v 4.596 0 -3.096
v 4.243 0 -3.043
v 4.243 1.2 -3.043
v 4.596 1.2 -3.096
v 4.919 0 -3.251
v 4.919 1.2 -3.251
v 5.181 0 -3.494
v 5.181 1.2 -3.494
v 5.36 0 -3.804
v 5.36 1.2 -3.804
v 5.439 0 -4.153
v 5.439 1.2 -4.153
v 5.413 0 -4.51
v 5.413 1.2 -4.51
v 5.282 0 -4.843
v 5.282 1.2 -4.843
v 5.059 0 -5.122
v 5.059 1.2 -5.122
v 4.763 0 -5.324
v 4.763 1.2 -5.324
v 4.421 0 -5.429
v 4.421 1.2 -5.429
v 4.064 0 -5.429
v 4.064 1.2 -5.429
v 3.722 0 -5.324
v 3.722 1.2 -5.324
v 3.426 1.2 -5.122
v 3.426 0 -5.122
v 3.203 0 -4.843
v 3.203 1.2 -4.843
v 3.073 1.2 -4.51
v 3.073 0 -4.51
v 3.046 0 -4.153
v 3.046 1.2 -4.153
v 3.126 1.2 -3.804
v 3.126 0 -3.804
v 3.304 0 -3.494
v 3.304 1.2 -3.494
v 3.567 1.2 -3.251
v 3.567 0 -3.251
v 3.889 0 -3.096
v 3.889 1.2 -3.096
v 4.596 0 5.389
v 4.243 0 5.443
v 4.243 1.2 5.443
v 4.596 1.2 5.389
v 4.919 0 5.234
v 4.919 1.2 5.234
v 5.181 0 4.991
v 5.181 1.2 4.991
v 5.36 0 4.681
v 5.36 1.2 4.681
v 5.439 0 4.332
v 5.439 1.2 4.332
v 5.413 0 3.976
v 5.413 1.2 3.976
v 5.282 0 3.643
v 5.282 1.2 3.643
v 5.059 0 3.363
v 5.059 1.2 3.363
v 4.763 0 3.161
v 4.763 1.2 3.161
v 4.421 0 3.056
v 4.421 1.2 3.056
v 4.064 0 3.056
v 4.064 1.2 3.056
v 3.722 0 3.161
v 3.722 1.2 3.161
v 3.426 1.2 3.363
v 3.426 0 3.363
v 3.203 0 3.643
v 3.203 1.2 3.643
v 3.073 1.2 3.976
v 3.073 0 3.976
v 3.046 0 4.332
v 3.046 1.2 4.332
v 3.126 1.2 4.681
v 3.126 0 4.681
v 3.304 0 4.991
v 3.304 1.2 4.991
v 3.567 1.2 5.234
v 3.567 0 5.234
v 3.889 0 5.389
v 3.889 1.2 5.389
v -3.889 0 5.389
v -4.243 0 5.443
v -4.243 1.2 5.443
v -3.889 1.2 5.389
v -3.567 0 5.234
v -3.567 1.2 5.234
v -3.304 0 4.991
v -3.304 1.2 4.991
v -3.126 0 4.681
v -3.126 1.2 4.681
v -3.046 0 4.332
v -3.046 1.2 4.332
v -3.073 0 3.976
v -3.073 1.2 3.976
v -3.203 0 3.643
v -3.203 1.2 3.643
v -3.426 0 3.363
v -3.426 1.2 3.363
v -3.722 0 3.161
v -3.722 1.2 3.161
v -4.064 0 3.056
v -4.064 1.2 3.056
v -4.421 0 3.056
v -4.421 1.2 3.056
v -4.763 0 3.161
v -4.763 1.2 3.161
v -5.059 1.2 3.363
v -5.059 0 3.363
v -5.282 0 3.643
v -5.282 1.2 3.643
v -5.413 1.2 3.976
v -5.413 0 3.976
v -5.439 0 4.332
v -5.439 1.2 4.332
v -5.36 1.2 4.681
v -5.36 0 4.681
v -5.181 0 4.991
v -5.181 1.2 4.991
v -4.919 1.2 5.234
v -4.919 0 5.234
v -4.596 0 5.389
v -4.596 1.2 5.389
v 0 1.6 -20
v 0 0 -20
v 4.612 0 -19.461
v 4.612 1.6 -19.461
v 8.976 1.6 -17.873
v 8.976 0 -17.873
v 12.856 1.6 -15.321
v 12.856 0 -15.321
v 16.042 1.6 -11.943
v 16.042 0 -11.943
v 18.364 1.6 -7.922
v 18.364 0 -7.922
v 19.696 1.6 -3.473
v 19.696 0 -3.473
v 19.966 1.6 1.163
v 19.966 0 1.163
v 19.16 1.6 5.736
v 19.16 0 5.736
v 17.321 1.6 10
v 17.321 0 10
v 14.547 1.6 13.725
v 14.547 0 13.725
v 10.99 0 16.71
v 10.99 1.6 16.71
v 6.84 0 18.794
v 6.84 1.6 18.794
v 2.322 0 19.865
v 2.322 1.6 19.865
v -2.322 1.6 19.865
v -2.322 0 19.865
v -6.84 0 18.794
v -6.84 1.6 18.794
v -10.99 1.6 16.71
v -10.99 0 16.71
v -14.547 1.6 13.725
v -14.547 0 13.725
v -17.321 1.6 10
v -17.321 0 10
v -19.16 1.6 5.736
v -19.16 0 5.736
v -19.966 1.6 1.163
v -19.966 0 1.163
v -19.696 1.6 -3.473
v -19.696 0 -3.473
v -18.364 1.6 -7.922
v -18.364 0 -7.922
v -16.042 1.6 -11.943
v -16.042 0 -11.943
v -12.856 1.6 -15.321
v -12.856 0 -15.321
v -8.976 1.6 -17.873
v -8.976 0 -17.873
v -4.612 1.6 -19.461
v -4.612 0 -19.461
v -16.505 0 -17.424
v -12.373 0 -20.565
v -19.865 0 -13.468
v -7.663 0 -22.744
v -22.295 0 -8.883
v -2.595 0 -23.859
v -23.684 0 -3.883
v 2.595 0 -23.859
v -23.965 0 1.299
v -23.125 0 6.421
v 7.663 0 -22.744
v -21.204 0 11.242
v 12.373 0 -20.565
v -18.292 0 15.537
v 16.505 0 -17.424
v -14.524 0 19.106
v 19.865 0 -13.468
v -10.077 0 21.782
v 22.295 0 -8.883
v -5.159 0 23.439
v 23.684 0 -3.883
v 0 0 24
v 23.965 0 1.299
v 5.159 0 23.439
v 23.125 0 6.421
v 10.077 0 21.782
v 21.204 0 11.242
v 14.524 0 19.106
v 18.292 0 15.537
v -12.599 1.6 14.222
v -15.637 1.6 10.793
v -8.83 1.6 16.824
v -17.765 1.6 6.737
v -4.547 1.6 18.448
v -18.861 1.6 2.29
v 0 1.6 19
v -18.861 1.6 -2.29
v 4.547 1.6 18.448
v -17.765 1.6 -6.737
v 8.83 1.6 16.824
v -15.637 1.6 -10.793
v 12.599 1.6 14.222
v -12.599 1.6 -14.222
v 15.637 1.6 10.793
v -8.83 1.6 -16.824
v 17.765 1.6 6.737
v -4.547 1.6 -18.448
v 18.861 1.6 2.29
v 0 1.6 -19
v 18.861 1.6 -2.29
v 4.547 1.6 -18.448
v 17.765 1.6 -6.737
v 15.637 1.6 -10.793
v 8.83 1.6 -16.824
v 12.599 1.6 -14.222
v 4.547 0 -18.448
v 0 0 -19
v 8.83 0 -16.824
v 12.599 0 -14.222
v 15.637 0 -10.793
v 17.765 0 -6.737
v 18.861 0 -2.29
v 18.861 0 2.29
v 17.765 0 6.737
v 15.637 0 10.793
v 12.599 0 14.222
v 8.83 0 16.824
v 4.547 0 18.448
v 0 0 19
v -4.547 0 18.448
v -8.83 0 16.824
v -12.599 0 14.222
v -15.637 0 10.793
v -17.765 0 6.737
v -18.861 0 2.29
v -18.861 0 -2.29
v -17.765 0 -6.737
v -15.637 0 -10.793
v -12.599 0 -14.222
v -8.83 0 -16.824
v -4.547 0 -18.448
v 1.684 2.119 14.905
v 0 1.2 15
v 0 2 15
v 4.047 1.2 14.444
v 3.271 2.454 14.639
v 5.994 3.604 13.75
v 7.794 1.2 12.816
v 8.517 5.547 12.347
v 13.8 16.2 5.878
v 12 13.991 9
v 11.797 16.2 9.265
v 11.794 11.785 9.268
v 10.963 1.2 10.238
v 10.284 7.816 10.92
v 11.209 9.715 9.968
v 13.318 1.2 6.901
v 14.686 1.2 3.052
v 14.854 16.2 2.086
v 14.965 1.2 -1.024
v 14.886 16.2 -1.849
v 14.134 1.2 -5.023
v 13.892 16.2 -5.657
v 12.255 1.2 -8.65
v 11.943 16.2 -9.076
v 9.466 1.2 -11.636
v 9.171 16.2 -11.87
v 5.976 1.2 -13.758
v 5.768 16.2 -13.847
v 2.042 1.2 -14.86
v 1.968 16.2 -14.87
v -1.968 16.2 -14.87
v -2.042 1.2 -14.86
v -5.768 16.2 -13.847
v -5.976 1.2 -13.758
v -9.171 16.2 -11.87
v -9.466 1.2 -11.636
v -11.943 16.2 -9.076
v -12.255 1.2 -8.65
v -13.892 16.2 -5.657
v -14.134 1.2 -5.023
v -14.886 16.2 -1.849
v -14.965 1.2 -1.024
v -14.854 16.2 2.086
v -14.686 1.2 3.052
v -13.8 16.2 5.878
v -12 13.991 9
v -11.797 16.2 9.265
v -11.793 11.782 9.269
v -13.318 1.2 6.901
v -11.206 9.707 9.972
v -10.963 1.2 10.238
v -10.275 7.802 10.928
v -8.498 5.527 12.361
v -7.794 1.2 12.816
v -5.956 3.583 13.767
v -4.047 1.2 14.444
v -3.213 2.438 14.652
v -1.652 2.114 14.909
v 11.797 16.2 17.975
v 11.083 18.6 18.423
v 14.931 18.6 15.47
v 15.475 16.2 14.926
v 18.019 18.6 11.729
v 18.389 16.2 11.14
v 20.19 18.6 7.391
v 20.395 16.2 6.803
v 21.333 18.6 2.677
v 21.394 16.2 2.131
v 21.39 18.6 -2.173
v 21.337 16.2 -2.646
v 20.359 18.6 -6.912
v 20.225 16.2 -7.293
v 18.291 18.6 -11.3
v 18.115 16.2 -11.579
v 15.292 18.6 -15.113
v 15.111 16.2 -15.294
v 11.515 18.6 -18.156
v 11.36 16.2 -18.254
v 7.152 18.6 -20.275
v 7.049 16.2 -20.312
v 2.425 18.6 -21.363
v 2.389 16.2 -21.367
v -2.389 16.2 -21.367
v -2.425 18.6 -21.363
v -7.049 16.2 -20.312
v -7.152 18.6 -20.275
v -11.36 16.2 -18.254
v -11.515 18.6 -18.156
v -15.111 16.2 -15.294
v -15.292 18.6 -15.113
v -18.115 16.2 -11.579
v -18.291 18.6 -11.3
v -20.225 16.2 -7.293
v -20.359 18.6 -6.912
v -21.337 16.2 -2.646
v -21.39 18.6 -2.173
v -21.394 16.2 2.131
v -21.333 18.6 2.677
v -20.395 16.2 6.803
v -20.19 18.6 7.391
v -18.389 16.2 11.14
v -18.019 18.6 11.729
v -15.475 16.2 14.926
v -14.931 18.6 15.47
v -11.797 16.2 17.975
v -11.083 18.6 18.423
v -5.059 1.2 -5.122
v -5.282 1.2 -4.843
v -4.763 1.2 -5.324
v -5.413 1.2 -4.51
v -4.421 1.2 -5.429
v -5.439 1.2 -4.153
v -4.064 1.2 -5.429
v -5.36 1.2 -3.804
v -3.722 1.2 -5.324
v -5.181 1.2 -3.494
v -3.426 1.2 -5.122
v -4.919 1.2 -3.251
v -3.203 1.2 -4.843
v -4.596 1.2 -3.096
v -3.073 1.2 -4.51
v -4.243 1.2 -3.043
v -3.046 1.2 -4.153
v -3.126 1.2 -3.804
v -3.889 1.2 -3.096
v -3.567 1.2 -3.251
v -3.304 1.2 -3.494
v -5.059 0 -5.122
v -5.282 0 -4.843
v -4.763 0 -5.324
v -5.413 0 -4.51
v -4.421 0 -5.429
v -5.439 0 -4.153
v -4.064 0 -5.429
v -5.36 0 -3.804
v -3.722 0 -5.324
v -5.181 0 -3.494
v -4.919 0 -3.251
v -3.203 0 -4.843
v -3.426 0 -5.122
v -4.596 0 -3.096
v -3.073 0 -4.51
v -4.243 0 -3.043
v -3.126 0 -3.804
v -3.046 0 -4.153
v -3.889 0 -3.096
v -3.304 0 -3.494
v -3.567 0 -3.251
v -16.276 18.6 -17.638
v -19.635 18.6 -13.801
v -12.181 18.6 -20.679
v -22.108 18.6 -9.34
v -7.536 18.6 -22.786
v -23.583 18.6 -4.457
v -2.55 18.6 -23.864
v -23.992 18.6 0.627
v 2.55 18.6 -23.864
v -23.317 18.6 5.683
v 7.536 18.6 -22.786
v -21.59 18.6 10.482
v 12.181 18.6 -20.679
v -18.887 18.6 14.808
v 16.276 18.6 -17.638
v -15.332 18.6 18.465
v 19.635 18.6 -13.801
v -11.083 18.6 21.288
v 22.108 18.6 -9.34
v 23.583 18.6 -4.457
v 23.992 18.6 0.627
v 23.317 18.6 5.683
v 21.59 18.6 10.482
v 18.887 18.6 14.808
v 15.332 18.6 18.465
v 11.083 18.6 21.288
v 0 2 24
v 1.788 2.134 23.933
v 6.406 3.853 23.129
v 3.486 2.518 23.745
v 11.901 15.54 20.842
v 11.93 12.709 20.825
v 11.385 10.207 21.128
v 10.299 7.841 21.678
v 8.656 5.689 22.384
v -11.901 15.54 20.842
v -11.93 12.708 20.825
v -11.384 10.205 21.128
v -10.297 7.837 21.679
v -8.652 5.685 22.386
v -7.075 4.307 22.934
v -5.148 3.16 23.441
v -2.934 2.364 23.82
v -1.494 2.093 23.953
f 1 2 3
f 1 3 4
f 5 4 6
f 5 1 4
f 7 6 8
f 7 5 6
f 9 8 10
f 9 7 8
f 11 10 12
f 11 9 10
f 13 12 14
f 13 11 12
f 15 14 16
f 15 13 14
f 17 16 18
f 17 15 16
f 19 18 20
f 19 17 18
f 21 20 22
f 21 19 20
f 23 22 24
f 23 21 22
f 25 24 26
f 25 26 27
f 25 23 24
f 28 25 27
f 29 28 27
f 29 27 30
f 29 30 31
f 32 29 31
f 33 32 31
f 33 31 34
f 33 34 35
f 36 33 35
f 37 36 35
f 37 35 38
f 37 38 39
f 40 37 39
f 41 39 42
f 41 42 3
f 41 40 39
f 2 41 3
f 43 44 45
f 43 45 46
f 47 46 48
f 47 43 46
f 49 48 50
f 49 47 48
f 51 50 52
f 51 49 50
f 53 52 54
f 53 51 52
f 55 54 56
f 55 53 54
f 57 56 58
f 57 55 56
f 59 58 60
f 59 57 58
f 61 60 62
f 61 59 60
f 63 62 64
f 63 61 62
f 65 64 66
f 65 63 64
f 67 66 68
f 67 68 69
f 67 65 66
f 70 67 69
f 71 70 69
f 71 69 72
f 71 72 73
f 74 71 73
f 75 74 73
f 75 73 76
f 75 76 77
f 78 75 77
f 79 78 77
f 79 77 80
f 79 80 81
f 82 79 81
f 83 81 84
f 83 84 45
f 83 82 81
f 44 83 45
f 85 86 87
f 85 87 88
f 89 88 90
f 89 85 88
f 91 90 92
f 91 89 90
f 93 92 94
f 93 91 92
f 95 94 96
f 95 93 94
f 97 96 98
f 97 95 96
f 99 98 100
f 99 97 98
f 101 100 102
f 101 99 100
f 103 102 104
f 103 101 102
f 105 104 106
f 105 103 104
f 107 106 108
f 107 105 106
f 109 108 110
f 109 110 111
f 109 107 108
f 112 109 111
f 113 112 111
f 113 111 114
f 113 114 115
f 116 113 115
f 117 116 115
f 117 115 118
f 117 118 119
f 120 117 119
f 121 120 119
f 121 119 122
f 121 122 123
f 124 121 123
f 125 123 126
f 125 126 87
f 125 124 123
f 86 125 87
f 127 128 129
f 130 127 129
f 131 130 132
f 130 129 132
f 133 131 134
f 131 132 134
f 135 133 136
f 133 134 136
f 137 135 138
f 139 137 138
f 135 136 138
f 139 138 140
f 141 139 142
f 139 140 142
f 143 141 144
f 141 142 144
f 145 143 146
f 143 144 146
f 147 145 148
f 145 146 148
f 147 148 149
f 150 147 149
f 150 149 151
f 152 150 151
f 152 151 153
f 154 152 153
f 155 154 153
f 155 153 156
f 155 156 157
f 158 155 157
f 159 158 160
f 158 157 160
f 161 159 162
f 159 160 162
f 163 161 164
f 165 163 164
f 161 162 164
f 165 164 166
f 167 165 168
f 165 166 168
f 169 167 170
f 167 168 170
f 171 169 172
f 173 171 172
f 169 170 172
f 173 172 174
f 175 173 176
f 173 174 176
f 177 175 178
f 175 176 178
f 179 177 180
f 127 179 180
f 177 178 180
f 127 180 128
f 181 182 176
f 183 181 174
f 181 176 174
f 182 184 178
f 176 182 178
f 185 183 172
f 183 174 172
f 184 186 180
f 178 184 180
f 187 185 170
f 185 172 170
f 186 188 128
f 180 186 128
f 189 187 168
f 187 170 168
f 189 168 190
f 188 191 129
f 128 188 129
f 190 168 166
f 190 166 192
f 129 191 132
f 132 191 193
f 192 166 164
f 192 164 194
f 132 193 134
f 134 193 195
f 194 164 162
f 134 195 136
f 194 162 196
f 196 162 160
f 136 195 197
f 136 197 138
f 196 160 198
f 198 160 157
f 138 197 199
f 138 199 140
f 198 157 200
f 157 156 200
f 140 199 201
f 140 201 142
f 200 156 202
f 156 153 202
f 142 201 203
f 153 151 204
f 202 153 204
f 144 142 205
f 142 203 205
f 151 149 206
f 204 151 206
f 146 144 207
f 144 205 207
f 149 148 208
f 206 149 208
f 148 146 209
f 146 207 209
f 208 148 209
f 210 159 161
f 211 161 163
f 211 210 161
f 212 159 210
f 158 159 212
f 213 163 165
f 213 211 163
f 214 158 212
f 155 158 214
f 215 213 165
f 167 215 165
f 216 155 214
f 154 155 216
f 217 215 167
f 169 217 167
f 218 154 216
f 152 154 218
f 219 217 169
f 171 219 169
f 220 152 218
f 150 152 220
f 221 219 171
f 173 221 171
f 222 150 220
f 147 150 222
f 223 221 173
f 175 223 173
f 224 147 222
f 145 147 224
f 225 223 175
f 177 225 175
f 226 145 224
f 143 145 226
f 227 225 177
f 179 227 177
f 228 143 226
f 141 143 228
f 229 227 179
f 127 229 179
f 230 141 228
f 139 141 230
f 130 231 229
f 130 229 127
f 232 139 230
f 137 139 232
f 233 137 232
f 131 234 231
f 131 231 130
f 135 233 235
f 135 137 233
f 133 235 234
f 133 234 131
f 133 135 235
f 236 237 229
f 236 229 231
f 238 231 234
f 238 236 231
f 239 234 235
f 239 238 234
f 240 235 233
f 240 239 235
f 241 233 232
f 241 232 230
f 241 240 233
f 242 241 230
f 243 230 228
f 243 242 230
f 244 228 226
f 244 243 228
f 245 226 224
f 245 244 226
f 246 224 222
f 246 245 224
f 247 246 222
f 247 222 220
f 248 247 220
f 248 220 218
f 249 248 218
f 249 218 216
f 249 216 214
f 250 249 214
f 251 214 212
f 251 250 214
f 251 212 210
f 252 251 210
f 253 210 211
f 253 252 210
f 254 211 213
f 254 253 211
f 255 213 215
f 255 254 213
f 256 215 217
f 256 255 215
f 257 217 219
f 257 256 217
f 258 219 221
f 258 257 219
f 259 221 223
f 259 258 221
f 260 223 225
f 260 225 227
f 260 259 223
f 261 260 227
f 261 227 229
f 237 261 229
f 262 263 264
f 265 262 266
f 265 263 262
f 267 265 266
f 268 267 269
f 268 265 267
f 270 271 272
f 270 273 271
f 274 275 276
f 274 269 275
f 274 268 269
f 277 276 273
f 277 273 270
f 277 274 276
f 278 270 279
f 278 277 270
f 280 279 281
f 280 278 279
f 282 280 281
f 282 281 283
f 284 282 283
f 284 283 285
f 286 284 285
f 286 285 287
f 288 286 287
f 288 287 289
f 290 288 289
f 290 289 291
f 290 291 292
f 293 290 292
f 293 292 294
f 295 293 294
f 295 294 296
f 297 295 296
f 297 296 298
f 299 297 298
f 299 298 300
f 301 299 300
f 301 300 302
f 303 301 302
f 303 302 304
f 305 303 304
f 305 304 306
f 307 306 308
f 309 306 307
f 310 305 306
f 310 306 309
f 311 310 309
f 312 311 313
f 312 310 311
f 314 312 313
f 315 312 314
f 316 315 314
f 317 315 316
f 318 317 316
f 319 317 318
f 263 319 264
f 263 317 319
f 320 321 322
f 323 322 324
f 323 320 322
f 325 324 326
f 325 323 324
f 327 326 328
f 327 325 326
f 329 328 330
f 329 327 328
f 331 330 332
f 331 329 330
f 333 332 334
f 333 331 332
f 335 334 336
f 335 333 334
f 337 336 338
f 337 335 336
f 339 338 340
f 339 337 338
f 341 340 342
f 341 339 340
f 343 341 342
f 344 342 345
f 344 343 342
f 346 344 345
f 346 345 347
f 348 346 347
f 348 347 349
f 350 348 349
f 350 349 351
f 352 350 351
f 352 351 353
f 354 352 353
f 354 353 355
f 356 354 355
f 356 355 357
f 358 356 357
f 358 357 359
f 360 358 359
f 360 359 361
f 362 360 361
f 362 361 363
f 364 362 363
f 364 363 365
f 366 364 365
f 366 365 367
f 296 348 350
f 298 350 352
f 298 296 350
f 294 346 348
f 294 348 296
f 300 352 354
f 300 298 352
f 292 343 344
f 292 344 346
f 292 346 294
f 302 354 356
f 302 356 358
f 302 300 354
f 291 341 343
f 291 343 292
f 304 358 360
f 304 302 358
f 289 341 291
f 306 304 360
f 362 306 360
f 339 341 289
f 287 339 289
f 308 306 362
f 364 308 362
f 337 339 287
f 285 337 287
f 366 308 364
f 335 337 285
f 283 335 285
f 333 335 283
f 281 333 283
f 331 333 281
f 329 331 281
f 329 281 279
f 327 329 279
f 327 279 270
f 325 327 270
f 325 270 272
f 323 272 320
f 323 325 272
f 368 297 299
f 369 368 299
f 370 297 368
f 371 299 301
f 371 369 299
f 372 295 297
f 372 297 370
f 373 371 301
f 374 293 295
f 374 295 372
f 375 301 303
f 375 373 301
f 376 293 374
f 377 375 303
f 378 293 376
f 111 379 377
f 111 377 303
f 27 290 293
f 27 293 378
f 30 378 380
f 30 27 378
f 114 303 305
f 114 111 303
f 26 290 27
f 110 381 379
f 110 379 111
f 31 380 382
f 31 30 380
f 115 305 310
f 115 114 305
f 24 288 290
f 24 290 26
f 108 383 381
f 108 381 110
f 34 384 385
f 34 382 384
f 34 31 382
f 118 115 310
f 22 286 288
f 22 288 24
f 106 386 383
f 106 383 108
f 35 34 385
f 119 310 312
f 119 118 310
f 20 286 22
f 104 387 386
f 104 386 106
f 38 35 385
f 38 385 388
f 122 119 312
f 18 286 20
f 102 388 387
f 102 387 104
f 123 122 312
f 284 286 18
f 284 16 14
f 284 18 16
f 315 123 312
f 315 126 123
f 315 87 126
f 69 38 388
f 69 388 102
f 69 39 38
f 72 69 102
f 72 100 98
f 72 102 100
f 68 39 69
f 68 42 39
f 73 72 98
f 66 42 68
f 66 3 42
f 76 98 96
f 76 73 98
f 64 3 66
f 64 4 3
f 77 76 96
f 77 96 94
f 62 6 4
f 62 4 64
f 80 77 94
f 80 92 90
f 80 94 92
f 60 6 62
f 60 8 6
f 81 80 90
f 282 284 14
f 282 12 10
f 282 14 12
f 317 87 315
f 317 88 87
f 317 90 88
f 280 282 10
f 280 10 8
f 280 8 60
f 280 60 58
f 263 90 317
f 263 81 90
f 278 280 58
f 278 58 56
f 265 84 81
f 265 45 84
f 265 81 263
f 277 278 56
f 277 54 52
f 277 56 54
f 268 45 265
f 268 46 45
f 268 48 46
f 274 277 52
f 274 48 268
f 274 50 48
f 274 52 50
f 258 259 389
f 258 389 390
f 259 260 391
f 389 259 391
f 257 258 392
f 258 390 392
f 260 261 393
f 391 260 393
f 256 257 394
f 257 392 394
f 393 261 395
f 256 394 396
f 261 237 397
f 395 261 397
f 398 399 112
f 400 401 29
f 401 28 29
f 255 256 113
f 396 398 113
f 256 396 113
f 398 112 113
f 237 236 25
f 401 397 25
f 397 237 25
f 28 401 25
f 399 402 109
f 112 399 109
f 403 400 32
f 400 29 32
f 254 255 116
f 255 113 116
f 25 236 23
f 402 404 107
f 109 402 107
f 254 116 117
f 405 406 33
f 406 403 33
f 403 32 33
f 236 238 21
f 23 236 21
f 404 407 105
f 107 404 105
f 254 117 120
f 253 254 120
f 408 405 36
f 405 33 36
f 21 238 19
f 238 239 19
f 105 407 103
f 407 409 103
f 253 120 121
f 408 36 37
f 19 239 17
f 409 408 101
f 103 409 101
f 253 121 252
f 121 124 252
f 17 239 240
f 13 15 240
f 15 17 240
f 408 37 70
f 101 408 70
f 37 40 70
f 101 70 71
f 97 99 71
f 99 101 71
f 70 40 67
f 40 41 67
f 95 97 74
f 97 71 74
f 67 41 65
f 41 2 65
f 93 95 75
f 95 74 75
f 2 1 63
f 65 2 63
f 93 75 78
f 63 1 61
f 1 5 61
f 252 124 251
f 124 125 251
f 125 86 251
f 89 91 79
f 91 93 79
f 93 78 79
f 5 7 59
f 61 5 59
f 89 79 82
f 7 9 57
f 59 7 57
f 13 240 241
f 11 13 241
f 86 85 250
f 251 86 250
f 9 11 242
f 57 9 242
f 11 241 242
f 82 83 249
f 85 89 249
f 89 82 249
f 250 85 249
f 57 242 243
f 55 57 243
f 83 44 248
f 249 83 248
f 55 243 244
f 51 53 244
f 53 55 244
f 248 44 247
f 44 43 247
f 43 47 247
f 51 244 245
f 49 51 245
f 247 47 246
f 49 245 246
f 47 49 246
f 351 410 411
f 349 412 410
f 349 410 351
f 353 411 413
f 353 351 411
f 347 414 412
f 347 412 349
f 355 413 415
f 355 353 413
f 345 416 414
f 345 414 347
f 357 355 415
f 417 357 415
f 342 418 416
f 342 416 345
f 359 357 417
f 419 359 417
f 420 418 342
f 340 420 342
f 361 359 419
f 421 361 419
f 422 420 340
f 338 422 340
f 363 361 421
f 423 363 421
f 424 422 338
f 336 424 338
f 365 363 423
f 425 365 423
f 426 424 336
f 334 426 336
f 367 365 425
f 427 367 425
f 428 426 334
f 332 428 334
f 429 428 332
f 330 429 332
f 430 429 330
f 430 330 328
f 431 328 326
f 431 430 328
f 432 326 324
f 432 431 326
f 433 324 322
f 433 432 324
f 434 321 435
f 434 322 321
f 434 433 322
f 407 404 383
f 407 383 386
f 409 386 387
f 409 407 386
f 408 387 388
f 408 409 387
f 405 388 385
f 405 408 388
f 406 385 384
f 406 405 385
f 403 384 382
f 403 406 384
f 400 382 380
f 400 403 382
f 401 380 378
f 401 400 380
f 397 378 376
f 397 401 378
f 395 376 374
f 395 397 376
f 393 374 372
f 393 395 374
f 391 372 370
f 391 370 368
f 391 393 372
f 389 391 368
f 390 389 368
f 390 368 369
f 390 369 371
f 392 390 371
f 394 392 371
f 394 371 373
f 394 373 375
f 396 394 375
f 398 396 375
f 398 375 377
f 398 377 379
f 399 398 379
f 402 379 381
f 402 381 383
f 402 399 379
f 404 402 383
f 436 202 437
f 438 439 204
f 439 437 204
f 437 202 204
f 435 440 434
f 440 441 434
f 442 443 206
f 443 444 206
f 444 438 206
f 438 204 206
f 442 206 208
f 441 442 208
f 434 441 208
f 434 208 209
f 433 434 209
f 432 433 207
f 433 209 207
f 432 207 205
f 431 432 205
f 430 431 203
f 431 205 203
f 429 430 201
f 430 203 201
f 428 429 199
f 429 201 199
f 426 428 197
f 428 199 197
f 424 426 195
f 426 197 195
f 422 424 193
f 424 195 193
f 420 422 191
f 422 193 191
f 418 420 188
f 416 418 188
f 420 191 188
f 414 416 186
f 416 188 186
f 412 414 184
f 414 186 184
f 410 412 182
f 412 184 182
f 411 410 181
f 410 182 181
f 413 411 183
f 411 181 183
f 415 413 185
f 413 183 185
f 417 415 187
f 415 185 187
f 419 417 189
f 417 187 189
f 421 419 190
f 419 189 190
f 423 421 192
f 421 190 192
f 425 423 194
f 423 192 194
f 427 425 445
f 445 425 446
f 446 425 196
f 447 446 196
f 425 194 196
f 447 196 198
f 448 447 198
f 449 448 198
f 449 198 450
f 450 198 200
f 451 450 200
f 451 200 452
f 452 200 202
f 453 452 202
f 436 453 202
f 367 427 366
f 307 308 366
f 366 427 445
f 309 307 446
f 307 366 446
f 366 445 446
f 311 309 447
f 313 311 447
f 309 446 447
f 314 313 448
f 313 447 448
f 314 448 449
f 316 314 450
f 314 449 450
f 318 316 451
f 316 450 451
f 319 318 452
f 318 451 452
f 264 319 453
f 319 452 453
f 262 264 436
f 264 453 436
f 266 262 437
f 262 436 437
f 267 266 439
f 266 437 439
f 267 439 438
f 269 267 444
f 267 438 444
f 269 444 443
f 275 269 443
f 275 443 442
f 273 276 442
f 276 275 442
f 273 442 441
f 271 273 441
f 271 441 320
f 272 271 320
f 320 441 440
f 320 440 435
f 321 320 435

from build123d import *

# Parameters (mm, degrees)
SKETCH1_R           = 24
SKETCH1_R_2         = 1.2
BOSS_EXTRUDE1_DEPTH = 1.2
SKETCH2_R           = 24
SKETCH2_R_2         = 15
BOSS_EXTRUDE2_DEPTH = 15
SKETCH3_R           = 24
SKETCH3_R_2         = 21.5
BOSS_EXTRUDE3_DEPTH = 2.4
SKETCH5_R           = 12
CUT_EXTRUDE2_DEPTH  = 20
SKETCH6_R           = 20
SKETCH6_R_2         = 19
CUT_EXTRUDE3_DEPTH  = 1.6


with BuildPart() as part:
    # Sketch1 → Boss-Extrude1 (new body)
    with BuildSketch(Plane(origin=(0, 0, 0), x_dir=(1, 0, 0), z_dir=(0, 1, 0))):
        with Locations(Location((0, 0, 0), (0, 0, 270))):
            Circle(SKETCH1_R)
        with Locations(Location((4.242640687, 4.242640687, 0), (0, 0, 270))):
            Circle(SKETCH1_R_2, mode=Mode.SUBTRACT)
        with Locations(Location((-4.242640687, 4.242640687, 0), (0, 0, 270))):
            Circle(SKETCH1_R_2, mode=Mode.SUBTRACT)
        with Locations(Location((4.242640687, -4.242640687, 0), (0, 0, 270))):
            Circle(SKETCH1_R_2, mode=Mode.SUBTRACT)
        with Locations(Location((-4.242640687, -4.242640687, 0), (0, 0, 270))):
            Circle(SKETCH1_R_2, mode=Mode.SUBTRACT)
    extrude(amount=BOSS_EXTRUDE1_DEPTH)

    # Sketch2 → Boss-Extrude2 (add)
    with BuildSketch(Plane(origin=(0, 1.2, 0), x_dir=(1, 0, 0), z_dir=(0, 1, 0))):
        with Locations(Location((0, 0, 0), (0, 0, 270))):
            Circle(SKETCH2_R)
        with Locations(Location((0, 0, 0), (0, 0, 270))):
            Circle(SKETCH2_R_2, mode=Mode.SUBTRACT)
    extrude(amount=BOSS_EXTRUDE2_DEPTH)

    # Sketch3 → Boss-Extrude3 (add)
    with BuildSketch(Plane(origin=(0, 16.2, 0), x_dir=(1, 0, 0), z_dir=(0, 1, 0))):
        with Locations(Location((0, 0, 0), (0, 0, 270))):
            Circle(SKETCH3_R)
        with Locations(Location((0, 0, 0), (0, 0, 270))):
            Circle(SKETCH3_R_2, mode=Mode.SUBTRACT)
    extrude(amount=BOSS_EXTRUDE3_DEPTH)

    # Sketch5 → Cut-Extrude2 (cut)
    with BuildSketch(Plane.XY.offset(24)):
        with Locations((0, 14)):
            Circle(SKETCH5_R)
    extrude(amount=-CUT_EXTRUDE2_DEPTH, mode=Mode.SUBTRACT)

    # Sketch6 → Cut-Extrude3 (cut)
    with BuildSketch(Plane.XZ):
        with Locations(Location((0, 0, 0), (0, 0, 270))):
            Circle(SKETCH6_R)
        with Locations(Location((0, 0, 0), (0, 0, 270))):
            Circle(SKETCH6_R_2, mode=Mode.SUBTRACT)
    extrude(amount=-CUT_EXTRUDE3_DEPTH, mode=Mode.SUBTRACT)


solid = part.part
